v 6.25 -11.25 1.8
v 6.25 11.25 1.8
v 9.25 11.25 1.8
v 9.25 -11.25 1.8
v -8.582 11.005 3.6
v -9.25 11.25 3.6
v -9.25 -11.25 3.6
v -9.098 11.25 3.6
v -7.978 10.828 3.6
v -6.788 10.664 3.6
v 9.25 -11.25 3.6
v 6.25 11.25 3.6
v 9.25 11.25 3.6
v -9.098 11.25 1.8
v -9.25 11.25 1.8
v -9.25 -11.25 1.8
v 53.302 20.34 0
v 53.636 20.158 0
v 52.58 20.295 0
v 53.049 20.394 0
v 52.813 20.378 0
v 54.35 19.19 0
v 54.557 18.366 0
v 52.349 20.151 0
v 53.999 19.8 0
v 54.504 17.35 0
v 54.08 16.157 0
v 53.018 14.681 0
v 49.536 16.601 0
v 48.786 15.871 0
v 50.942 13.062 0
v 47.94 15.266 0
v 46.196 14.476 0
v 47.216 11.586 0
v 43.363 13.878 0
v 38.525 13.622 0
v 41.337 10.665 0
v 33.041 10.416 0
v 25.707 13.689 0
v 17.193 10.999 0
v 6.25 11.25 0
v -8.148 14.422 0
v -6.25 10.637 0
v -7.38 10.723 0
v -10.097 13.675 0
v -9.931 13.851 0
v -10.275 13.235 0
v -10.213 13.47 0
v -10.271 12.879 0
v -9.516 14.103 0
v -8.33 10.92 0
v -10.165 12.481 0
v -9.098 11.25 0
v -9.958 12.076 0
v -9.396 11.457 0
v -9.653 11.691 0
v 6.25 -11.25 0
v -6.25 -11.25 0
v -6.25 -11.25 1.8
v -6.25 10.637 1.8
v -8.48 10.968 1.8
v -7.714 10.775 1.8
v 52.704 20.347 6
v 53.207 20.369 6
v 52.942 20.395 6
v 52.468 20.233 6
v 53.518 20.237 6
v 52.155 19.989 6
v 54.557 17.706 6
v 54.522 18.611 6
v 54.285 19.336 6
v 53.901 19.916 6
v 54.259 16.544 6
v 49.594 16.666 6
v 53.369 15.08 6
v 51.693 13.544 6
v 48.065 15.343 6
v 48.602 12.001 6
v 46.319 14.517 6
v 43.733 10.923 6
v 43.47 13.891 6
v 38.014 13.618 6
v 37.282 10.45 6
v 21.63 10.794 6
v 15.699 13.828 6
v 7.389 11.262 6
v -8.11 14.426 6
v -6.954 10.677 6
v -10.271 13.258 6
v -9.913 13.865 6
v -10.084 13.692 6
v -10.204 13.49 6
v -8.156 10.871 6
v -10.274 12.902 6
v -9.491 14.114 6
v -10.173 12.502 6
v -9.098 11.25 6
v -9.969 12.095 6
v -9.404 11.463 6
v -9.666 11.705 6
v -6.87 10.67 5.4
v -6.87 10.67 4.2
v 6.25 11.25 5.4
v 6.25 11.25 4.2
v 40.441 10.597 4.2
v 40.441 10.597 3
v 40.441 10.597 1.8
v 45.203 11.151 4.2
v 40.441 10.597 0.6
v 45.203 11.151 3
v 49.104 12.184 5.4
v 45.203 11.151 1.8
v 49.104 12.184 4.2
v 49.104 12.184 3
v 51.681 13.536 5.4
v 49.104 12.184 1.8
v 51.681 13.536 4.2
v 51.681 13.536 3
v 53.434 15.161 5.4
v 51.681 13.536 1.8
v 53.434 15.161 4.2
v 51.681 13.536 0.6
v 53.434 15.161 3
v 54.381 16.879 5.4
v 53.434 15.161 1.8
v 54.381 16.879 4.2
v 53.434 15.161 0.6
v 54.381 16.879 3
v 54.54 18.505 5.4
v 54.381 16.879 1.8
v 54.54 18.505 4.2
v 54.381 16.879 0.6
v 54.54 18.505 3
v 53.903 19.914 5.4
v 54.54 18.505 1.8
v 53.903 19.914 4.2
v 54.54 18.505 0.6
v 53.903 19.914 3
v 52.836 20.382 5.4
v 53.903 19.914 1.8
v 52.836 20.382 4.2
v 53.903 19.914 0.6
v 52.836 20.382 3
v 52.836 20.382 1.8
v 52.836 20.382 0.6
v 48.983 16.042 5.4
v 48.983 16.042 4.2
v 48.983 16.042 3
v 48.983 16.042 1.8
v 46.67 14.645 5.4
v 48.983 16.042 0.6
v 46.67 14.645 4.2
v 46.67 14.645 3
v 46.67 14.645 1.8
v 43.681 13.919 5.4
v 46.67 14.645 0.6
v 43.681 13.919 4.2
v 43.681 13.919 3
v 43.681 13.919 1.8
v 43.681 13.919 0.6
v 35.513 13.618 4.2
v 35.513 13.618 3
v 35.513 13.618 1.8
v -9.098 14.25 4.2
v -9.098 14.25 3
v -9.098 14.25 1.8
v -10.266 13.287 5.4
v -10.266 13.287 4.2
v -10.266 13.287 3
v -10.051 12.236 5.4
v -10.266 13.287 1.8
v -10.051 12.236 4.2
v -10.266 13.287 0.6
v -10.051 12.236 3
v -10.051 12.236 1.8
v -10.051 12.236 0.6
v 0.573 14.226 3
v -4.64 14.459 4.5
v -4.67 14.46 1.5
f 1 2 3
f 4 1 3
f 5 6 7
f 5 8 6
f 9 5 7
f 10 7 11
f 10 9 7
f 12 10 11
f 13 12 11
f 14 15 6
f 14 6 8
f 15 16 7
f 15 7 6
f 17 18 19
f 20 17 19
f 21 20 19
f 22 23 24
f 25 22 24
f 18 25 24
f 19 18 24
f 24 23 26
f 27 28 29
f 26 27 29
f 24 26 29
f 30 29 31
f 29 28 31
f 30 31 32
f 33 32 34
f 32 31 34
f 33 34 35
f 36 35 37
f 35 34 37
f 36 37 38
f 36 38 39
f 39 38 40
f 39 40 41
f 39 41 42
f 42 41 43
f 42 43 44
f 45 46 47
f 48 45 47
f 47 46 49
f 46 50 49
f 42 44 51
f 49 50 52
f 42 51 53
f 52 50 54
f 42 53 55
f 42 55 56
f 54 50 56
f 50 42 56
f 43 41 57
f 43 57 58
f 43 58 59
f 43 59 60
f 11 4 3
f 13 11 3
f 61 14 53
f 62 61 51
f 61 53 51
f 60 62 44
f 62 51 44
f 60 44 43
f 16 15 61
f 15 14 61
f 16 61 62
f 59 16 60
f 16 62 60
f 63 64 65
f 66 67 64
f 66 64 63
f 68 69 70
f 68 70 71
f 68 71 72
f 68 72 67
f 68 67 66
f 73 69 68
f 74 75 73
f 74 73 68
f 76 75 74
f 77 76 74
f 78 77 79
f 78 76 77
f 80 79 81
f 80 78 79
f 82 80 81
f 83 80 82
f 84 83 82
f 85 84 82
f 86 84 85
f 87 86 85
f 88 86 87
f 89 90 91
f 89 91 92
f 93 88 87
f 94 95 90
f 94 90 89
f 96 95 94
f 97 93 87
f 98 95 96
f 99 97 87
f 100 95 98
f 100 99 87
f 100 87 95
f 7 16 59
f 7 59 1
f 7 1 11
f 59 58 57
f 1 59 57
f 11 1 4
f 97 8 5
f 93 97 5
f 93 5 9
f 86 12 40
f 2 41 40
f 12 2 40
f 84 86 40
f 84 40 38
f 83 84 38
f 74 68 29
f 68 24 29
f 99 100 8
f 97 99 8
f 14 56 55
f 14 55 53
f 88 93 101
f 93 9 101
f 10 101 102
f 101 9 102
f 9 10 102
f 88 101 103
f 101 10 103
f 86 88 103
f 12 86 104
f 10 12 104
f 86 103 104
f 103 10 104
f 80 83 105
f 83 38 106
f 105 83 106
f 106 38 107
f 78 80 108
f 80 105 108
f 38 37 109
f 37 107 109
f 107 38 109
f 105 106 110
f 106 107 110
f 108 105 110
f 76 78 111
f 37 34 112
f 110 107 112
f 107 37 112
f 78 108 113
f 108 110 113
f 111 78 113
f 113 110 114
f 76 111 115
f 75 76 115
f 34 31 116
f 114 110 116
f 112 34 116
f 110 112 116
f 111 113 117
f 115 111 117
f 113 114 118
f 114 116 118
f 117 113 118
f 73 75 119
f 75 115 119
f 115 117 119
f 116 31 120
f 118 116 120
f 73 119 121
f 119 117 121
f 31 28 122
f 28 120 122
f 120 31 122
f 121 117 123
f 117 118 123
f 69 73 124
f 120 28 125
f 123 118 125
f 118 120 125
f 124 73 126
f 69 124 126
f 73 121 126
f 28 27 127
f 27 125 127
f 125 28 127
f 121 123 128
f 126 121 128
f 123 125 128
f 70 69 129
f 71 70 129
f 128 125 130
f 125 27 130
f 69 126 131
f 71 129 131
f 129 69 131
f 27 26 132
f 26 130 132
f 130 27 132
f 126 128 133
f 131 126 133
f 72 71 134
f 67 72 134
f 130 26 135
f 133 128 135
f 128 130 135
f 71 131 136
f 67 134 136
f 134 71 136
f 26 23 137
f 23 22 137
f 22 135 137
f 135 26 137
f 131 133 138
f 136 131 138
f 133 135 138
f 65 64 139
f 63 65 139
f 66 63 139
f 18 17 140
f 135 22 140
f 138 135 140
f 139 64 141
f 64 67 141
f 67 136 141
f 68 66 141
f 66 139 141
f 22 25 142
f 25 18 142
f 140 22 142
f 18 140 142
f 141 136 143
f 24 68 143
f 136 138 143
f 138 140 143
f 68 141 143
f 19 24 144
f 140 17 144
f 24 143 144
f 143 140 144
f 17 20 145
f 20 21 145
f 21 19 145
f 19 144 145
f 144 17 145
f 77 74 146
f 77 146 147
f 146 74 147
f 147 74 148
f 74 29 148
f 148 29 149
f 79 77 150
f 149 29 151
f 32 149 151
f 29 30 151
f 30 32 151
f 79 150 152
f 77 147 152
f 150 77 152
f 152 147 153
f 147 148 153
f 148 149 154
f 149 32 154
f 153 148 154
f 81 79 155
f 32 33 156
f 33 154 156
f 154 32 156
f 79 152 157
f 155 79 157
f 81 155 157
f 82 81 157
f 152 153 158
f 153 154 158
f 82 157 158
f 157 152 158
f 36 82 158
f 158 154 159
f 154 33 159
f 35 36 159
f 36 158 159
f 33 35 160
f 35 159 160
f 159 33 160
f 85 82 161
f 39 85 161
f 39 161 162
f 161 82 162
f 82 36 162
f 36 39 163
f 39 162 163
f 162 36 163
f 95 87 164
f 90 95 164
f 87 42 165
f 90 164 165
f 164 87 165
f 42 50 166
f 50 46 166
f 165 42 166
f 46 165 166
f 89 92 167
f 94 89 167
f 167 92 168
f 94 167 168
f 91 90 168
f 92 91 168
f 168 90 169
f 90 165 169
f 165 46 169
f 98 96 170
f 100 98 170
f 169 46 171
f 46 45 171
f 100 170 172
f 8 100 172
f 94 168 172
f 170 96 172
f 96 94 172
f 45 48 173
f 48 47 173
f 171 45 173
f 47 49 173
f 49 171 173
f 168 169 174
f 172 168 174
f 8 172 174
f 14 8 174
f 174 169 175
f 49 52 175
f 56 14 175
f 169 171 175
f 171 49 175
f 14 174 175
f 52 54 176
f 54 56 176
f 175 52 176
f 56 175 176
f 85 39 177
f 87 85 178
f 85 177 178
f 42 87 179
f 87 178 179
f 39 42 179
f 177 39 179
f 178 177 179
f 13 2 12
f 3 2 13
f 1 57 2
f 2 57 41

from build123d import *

# Parameters (mm, degrees)
F0_W     = 12.5
F0_H     = 22.5
F1_DEPTH = 1.8
F2_W     = 18.5
F2_H     = 22.5
F3_DEPTH = 1.8
F5_DEPTH = 6


with BuildPart() as f1:
    # F0 (on Top) → F1 (new body)
    with BuildSketch(Plane.XY):
        Rectangle(F0_W, F0_H)
    extrude(amount=F1_DEPTH)

    # F2 (on face) → F3 (join)
    with BuildSketch(Plane.XY.offset(1.8)):
        Rectangle(F2_W, F2_H)
    extrude(amount=F3_DEPTH)

    # F4 (on face) → F5 (join)
    with BuildSketch(Plane(origin=(0, 0, 0), x_dir=(1, 0, 0), z_dir=(0, 0, -1))):
        with BuildLine():
            add(Edge.make_bspline(
                [(-9.0976858254, -11.25), (-6.8706241368, -9.9187913919), (7.1020154957, -13.1264777363), (49.136212841, -7.4735594424), (55.8092531319, -17.9978619181), (52.3782028422, -21.8741470739), (49.1639717171, -13.6644720864), (34.9818160527, -13.5267746198), (1.0738841294, -13.9640607138), (-8.6895998134, -14.7917894133), (-10.7108542551, -13.408156573), (-9.9688245371, -11.7707163133), (-9.0976858254, -11.25)],
                knots=[0, 0, 0, 0, 0.1194684025, 0.3191223759, 0.4071730815, 0.4557294221, 0.5291989938, 0.642016349, 0.8237591227, 0.9157398997, 0.953268672, 1, 1, 1, 1], degree=3))
        make_face()
    extrude(amount=-F5_DEPTH)


solid = f1.part
